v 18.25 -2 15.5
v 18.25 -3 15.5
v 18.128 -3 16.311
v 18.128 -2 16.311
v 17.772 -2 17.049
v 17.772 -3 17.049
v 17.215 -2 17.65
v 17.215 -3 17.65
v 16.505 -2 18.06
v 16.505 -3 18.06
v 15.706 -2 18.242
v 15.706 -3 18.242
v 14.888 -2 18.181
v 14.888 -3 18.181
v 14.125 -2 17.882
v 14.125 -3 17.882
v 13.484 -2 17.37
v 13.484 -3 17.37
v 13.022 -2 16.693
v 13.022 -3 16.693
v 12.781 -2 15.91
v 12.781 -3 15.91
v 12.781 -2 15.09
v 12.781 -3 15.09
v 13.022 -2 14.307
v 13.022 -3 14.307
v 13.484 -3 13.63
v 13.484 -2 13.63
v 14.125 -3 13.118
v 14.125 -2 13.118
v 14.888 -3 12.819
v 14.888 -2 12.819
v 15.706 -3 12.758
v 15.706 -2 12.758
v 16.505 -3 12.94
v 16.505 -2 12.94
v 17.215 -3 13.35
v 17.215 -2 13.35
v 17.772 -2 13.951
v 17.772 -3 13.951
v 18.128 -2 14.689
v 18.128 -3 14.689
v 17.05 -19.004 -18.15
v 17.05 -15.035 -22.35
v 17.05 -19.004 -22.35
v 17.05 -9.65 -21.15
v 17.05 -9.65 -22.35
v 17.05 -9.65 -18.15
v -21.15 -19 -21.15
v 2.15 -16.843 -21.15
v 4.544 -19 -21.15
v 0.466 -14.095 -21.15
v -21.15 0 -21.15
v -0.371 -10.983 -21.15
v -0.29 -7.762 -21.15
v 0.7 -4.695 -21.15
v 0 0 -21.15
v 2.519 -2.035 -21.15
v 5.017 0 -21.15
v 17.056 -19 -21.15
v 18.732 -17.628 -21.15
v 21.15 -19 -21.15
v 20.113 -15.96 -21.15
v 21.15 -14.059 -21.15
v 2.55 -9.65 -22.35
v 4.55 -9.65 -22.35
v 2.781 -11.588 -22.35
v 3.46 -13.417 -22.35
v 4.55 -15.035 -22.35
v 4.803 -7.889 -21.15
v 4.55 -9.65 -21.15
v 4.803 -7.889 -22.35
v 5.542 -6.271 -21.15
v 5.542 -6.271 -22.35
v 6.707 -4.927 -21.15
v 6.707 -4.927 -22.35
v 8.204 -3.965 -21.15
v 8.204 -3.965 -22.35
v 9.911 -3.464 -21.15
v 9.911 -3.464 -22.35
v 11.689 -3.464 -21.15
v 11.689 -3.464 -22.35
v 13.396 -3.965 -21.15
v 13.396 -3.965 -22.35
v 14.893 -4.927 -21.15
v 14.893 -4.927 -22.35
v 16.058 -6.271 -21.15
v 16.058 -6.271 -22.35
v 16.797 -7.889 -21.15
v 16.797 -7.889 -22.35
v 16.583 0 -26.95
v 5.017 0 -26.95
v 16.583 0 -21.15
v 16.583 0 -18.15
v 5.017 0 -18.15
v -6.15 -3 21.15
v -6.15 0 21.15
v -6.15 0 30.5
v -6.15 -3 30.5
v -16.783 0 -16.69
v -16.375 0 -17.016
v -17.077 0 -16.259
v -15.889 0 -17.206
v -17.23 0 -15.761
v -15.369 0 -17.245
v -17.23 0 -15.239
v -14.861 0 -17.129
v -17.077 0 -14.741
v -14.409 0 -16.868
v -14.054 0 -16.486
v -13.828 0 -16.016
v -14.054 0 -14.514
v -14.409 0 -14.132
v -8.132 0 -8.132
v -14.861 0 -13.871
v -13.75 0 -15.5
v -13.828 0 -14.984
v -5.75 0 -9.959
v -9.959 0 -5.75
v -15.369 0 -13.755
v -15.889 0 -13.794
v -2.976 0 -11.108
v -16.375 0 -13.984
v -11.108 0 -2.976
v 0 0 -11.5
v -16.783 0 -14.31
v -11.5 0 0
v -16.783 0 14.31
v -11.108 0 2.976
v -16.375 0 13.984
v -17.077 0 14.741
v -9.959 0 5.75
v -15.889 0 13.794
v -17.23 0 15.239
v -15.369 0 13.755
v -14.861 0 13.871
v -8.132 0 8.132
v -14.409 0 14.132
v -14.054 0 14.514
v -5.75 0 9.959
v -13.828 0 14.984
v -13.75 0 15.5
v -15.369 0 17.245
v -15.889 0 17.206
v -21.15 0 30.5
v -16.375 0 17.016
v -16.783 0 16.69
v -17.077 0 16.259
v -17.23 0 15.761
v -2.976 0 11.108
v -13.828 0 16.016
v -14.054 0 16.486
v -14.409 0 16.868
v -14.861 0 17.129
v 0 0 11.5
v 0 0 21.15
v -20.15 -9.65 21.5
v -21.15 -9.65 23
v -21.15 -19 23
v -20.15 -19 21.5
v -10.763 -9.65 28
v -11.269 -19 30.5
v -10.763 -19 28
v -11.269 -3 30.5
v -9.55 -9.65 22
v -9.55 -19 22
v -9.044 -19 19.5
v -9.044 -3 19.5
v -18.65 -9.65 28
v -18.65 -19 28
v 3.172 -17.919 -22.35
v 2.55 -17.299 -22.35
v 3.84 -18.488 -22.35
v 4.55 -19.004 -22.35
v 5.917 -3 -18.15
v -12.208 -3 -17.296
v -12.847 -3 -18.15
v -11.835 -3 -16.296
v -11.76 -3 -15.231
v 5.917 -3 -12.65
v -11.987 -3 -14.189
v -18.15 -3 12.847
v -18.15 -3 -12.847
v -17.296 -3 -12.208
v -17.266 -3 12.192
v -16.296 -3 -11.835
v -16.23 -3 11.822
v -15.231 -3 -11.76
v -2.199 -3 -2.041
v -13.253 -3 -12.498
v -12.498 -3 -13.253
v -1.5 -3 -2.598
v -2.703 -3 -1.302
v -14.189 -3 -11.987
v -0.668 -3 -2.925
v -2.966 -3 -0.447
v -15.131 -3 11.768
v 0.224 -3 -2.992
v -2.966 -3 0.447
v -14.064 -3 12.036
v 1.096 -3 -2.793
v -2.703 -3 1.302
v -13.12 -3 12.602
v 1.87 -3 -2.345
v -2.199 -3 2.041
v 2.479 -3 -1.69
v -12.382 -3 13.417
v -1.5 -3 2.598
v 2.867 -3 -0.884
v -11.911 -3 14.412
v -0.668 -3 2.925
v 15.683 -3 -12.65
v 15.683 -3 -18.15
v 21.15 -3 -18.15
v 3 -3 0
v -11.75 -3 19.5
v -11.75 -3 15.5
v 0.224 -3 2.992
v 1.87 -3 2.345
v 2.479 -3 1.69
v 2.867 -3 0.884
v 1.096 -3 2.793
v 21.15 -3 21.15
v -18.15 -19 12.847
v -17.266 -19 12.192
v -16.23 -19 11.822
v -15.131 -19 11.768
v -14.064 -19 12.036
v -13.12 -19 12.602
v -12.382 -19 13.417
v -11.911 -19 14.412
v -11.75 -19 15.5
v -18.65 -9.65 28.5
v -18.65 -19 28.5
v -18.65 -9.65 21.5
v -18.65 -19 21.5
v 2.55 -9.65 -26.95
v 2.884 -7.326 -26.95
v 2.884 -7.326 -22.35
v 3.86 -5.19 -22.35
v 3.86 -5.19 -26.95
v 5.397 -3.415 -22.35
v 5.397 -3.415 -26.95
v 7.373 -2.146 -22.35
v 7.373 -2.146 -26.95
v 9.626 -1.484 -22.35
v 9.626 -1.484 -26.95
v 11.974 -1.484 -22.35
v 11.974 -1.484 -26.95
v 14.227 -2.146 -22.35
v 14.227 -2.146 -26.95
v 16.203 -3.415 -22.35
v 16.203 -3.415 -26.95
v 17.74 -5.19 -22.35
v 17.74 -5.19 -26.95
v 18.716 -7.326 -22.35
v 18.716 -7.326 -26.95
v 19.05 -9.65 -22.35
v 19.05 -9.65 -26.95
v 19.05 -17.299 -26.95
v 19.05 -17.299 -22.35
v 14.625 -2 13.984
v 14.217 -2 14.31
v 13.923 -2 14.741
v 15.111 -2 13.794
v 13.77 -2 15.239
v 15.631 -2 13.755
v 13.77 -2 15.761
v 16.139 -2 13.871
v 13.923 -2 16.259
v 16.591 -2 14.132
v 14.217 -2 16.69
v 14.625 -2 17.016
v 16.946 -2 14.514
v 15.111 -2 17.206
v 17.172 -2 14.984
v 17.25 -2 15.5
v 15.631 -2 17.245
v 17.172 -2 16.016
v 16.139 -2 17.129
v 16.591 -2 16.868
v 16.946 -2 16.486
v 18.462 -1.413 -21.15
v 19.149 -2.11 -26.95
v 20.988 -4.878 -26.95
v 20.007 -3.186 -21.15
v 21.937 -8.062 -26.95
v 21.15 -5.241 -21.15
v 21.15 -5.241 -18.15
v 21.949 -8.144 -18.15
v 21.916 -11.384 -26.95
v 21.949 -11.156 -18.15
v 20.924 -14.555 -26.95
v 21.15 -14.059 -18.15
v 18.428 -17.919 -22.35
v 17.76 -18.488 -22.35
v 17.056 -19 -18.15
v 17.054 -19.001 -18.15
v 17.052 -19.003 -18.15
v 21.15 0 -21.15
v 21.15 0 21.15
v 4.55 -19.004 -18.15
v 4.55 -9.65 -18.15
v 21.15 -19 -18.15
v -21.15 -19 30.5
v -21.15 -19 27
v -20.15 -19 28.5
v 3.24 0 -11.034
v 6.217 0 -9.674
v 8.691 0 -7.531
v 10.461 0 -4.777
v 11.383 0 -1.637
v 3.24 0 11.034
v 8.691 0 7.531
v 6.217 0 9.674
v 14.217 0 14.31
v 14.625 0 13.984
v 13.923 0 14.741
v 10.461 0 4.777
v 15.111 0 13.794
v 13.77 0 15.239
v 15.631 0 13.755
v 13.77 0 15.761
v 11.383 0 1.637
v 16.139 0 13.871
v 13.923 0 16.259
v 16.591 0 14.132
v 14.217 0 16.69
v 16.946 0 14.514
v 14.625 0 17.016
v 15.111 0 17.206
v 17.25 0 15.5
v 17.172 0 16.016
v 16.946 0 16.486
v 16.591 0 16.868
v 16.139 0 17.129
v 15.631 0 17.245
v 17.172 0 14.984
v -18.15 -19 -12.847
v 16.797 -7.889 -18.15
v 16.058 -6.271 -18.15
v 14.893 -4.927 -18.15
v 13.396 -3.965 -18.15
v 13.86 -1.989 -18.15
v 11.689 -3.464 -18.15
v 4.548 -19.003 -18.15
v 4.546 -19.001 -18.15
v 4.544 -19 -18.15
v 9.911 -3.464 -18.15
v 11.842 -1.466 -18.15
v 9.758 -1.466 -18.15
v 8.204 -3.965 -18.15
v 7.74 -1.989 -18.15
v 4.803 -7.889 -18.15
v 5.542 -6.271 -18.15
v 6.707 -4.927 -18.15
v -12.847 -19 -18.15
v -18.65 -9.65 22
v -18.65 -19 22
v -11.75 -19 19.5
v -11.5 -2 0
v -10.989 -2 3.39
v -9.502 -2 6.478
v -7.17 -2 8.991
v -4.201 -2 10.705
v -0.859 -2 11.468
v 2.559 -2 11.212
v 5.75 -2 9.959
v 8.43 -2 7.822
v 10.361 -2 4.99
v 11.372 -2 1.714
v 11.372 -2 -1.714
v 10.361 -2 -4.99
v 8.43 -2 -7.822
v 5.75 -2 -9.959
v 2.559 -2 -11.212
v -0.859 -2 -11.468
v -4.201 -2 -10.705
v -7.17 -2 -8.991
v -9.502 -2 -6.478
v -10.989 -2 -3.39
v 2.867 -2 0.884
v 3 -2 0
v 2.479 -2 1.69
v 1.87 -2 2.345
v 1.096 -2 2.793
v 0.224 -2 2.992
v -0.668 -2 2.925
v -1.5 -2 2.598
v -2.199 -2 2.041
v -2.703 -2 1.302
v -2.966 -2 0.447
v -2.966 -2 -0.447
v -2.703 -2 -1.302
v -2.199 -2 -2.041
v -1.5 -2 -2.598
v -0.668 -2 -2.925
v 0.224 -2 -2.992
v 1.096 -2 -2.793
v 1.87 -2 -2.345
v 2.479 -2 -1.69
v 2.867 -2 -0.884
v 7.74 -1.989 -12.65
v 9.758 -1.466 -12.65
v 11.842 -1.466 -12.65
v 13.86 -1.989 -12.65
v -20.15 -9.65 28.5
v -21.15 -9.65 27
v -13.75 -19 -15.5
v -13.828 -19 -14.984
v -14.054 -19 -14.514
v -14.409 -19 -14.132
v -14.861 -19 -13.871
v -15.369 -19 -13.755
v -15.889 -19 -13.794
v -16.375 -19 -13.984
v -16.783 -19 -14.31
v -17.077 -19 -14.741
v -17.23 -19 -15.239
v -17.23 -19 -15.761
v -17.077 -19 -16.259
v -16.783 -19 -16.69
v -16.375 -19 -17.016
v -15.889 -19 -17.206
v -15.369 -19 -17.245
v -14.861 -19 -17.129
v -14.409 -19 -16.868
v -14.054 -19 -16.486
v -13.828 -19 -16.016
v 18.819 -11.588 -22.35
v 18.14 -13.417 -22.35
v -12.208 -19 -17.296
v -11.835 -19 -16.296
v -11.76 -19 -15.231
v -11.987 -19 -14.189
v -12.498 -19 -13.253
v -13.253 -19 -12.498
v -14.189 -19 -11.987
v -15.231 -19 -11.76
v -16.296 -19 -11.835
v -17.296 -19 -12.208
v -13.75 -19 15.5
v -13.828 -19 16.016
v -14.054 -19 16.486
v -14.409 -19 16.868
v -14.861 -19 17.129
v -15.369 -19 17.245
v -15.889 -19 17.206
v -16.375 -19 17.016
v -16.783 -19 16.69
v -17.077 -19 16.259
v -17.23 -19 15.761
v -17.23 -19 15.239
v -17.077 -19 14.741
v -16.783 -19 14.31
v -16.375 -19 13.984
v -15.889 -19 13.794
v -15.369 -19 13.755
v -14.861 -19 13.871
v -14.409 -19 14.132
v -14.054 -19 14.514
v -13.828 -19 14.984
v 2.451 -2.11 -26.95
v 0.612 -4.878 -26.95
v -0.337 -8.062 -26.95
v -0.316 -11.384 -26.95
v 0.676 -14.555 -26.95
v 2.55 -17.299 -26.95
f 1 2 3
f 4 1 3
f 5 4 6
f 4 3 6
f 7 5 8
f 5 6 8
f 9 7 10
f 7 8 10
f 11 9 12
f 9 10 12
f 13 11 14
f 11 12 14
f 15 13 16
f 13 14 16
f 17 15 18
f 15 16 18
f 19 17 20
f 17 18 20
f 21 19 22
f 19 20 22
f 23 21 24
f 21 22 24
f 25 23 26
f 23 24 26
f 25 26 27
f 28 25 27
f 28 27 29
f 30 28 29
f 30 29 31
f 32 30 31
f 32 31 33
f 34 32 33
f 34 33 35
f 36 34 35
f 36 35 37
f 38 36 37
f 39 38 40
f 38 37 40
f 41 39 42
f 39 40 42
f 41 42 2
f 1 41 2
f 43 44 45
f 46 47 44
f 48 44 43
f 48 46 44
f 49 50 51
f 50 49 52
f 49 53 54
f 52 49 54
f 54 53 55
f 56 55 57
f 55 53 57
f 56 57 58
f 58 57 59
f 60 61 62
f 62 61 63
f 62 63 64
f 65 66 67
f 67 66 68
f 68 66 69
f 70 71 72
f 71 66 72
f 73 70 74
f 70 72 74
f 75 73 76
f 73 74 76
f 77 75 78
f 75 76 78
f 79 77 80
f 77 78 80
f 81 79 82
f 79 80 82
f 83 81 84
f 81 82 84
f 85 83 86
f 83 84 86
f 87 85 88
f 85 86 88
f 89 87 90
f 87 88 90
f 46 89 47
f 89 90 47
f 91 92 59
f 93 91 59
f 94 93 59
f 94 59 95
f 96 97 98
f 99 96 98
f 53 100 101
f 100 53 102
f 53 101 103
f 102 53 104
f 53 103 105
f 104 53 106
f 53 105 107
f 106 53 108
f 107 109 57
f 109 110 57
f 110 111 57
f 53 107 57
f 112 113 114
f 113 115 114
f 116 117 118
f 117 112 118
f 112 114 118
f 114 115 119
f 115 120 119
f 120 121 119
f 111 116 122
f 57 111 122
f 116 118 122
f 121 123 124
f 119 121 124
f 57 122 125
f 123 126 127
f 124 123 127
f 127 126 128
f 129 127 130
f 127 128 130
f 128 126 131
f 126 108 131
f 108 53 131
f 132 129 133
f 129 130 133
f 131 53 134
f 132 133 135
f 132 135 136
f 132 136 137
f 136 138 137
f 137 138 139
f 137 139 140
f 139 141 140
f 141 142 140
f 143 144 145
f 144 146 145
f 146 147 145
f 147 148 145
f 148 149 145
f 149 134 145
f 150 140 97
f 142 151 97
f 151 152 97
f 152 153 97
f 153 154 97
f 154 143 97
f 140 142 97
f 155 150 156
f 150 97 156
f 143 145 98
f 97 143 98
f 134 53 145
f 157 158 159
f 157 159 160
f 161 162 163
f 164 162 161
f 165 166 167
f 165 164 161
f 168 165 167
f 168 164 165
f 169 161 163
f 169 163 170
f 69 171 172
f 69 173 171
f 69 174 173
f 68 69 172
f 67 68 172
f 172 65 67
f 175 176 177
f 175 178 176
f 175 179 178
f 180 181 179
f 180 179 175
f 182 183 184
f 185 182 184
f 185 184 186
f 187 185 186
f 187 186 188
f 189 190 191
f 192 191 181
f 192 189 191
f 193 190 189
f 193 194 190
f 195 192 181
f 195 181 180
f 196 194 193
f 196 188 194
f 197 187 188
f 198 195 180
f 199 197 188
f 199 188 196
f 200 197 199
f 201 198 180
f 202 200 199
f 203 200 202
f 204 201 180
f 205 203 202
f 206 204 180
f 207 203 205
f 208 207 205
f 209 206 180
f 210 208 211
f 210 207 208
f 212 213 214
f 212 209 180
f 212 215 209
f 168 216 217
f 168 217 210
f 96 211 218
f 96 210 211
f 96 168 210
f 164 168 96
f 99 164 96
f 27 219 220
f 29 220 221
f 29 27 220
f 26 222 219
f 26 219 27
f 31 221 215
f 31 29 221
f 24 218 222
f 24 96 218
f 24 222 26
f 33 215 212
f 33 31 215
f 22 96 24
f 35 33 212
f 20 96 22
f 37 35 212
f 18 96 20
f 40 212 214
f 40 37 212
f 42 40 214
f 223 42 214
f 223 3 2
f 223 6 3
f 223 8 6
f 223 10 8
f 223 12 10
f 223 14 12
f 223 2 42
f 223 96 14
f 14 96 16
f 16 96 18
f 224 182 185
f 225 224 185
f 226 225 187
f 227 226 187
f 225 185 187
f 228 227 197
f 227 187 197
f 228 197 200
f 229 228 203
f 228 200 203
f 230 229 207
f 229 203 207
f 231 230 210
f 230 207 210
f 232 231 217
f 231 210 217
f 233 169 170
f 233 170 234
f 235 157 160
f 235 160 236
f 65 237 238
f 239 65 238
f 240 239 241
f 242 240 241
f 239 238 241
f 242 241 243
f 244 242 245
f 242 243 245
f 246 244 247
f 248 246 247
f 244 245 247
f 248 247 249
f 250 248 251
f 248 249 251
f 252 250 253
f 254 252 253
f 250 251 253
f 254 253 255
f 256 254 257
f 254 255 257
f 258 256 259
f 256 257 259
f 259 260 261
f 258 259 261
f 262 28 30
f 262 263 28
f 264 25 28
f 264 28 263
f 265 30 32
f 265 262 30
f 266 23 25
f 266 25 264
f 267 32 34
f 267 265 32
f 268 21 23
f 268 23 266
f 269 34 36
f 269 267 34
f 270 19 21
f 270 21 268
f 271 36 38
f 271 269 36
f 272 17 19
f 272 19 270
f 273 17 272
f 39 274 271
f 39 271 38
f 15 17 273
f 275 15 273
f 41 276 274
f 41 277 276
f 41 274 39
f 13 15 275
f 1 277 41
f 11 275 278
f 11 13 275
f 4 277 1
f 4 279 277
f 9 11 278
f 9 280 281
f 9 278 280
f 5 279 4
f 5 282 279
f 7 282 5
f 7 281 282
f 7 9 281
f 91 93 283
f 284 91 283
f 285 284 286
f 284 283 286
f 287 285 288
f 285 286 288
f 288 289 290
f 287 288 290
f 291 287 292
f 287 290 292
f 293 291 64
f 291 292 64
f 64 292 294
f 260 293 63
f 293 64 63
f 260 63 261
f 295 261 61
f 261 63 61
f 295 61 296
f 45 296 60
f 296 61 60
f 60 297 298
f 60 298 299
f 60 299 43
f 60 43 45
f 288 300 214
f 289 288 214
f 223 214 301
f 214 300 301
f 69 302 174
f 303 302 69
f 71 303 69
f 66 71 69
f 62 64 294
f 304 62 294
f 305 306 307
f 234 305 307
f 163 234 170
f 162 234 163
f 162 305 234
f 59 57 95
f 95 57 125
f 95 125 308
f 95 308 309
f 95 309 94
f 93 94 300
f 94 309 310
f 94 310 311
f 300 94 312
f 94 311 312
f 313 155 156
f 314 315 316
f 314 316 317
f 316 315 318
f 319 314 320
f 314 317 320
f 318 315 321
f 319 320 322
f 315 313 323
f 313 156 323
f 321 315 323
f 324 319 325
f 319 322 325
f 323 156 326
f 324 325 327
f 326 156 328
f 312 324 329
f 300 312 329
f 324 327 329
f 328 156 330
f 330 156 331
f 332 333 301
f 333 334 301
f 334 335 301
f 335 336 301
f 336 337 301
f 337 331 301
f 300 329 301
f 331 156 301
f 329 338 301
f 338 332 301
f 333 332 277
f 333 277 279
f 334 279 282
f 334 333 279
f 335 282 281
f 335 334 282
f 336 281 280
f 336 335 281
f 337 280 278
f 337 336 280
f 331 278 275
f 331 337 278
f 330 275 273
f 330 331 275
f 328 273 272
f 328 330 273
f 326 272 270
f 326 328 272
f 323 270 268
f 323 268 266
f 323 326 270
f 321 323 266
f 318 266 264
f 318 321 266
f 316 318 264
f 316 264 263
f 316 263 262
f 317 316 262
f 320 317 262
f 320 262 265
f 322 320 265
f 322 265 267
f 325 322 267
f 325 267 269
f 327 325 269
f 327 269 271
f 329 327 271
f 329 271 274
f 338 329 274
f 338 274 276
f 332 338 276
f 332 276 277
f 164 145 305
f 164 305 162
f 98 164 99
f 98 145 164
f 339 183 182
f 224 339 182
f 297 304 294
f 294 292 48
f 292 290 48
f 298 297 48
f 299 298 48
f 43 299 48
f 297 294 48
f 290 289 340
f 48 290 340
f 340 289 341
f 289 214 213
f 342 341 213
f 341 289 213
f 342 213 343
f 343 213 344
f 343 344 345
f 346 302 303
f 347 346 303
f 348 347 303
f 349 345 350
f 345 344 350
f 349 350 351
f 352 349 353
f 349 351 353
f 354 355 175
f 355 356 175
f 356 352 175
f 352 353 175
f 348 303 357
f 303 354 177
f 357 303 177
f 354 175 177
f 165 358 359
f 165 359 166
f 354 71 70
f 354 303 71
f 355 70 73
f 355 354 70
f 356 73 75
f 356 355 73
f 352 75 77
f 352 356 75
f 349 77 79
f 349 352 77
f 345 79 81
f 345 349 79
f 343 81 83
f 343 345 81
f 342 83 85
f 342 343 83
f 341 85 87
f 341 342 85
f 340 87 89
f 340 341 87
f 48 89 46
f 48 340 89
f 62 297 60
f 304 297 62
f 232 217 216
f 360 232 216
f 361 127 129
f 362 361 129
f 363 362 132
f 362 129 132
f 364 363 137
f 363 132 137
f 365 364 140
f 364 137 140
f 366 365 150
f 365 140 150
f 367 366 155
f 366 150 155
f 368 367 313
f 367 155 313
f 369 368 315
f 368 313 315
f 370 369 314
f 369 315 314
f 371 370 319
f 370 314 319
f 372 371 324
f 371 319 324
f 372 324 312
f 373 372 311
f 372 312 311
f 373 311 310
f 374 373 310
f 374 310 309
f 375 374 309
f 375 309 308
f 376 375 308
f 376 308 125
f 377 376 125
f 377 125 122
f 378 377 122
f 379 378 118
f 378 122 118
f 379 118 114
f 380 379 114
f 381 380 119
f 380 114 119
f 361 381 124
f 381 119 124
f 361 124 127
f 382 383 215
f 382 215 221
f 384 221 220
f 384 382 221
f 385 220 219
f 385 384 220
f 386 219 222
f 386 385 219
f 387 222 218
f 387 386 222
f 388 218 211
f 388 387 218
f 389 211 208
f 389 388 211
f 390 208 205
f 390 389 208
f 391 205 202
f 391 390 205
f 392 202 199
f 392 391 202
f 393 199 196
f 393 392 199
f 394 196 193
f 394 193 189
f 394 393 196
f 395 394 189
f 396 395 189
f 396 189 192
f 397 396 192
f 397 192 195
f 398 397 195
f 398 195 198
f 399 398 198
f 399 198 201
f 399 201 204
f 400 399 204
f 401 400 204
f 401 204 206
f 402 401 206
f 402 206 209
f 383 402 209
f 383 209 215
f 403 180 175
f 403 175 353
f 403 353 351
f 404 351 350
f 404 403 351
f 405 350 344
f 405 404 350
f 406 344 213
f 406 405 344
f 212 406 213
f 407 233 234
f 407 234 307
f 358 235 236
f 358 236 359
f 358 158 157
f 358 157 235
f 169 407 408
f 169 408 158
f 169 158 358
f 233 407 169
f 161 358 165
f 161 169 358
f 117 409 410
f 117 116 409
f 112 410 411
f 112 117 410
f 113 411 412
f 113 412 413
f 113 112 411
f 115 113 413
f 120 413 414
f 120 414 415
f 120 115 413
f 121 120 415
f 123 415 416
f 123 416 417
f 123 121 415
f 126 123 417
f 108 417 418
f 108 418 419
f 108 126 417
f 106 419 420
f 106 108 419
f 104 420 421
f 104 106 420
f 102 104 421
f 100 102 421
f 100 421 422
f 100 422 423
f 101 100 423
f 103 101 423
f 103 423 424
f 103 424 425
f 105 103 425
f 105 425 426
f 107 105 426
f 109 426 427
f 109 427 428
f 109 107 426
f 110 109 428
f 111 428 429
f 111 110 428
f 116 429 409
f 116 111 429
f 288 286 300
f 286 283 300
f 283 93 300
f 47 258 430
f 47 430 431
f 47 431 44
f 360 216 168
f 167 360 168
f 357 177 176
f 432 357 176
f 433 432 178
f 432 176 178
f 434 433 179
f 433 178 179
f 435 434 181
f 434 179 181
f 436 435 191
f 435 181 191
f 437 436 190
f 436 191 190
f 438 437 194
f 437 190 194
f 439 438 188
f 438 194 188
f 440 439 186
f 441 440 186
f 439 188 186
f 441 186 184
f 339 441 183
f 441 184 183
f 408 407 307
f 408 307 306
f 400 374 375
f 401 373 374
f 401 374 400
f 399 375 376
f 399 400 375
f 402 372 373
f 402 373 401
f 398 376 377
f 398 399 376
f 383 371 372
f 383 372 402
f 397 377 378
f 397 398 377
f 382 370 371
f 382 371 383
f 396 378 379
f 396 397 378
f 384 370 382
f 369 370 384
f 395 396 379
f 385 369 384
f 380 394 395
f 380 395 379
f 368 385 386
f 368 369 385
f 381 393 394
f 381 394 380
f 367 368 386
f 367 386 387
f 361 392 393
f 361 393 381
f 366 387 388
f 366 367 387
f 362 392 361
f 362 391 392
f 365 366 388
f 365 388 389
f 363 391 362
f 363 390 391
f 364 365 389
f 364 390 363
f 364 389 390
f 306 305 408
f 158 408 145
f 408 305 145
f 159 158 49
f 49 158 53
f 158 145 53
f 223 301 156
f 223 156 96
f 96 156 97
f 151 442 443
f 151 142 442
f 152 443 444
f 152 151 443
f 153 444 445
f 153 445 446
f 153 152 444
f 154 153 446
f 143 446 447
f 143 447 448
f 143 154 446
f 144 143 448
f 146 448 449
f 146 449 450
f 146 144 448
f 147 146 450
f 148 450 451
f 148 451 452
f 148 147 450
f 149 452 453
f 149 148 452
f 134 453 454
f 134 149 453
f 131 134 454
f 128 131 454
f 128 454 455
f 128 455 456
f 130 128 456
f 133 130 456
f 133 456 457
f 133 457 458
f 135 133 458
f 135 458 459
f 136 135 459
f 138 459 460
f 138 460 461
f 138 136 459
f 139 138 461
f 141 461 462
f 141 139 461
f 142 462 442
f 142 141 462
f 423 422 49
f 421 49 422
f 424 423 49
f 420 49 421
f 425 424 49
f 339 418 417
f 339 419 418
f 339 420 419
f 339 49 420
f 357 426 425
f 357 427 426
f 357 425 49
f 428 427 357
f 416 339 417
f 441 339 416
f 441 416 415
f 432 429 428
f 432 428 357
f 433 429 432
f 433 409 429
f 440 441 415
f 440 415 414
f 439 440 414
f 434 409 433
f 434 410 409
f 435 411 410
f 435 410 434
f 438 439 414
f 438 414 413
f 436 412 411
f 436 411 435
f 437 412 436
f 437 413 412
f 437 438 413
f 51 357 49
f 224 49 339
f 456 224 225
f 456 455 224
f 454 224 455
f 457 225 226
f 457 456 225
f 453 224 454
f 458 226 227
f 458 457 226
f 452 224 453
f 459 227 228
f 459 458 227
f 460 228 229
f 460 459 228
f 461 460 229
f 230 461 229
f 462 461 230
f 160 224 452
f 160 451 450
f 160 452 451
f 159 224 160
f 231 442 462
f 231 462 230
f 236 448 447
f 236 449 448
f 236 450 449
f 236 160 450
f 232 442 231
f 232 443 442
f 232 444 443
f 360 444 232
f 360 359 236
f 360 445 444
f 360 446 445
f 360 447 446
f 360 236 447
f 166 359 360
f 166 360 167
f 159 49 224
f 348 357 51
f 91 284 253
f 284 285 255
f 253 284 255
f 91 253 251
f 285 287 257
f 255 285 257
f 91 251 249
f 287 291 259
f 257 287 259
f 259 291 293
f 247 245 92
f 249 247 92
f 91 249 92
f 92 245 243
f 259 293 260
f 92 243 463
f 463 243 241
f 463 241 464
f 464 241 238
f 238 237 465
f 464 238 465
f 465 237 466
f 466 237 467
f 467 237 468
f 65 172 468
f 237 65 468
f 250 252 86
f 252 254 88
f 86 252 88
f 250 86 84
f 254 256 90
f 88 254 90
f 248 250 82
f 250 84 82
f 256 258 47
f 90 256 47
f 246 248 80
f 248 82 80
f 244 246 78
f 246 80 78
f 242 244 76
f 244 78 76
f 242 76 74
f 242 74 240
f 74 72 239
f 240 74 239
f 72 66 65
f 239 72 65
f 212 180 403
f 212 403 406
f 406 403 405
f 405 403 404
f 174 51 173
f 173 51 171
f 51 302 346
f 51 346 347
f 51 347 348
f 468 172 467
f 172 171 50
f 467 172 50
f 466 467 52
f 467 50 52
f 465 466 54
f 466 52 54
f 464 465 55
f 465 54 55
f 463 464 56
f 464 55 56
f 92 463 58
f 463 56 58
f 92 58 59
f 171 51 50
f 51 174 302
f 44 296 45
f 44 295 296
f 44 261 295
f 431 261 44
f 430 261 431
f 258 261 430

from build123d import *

# Parameters (mm, degrees)
F0_W      = 42.3
F0_H      = 42.3
F0_R      = 1.75
F0_R_2    = 3
F1_DEPTH  = 3
F2_R      = 11.5
F3_DEPTH  = 2
F4_R      = 1.75
F5_DEPTH  = 16
F9_W      = 15
F9_H      = 11
F10_DEPTH = 19
F11_DEPTH = 10
F18_DEPTH = 11.251
F19_W     = 28.3221583813
F19_H     = 99.7033566236
F20_DEPTH = 22.051
F22_DEPTH = 16.0051434669
F23_R     = 2.75
F23_R_2   = 1.75
F24_DEPTH = 1


# Not quite as in the source:
# - a feature names something its author has since deleted; it is built from what else it names


with BuildPart() as f1:
    # F0 (on Front) → F1 (new body)
    with BuildSketch(Plane.XZ):
        Rectangle(F0_W, F0_H)
        with Locations((-15.5, -15.5)):
            Circle(F0_R, mode=Mode.SUBTRACT)
        with Locations((-15.5, 15.5)):
            Circle(F0_R, mode=Mode.SUBTRACT)
        Circle(F0_R_2, mode=Mode.SUBTRACT)
        with Locations((15.5, 15.5)):
            Circle(F0_R, mode=Mode.SUBTRACT)
    extrude(amount=F1_DEPTH)

    # F2 (on face) → F3 (cut)
    with BuildSketch(Plane(origin=(0, 0, 0), x_dir=(-1, 0, 0), z_dir=(0, 1, 0))):
        Circle(F2_R)
    extrude(amount=-F3_DEPTH, mode=Mode.SUBTRACT)

    # F4 (on face) → F5 (join)
    with BuildSketch(Plane.XZ.offset(3)):
        with BuildLine():
            Line((-11.75, 21.15), (-21.15, 21.15))
            Line((-21.15, 21.15), (-21.15, -21.15))
            Line((-21.15, -21.15), (21.15, -21.15))
            Line((21.15, -21.15), (21.15, -18.15))
            Line((21.15, -18.15), (-12.8467001677, -18.15))
            ThreePointArc((-12.8467001677, -18.15), (-12.8483495706, -12.8483495706), (-18.15, -12.8467001677))
            Line((-18.15, -12.8467001677), (-18.15, 12.8467001677))
            ThreePointArc((-18.15, 12.8467001677), (-14.0638593384, 12.0358983849), (-11.75, 15.5))
            Line((-11.75, 15.5), (-11.75, 21.15))
        make_face()
        with Locations((-15.5, -15.5)):
            Circle(F4_R, mode=Mode.SUBTRACT)
        with Locations((-15.5, 15.5)):
            Circle(F4_R, mode=Mode.SUBTRACT)
    extrude(amount=F5_DEPTH)

    # F9 (on Front) → F10 (join, through all)
    with BuildSketch(Plane.XZ):
        with Locations((-13.65, 25)):
            Rectangle(F9_W, F9_H)
    extrude(amount=F10_DEPTH)

    # F8 (on offset) → F11 (cut)
    with BuildSketch(Plane.XZ.offset(9.65)):
        Polygon((0, 22), (0, 28), (-18.65, 28), (-18.65, 28.5), (-20.15, 28.5), (-21.15, 27), (-21.15, 23), (-20.15, 21.5), (-18.65, 21.5), (-18.65, 22), align=None)
    extrude(amount=F11_DEPTH, mode=Mode.SUBTRACT)

    # F13 (on offset) → F14 (revolve, cut)
    with BuildSketch(Plane.XZ.offset(9.65)):
        Polygon((17.05, -18.15), (19.05, -18.15), (19.05, -12.65), (10.8, -12.65), (10.8, -26.95), (19.05, -26.95), (19.05, -22.35), (17.05, -22.35), align=None)
    revolve(axis=Axis((10.8, -9.65, -5.160998553), (0, 0, -1)), mode=Mode.SUBTRACT)

    # F15 (on offset) → F16 (revolve)
    with BuildSketch(Plane.XZ.offset(9.65)):
        Polygon((19.05, -18.15), (17.05, -18.15), (17.05, -22.35), (19.05, -22.35), (19.05, -26.95), (22.05, -26.95), (22.05, -18.15), align=None)
    revolve(axis=Axis((10.8, -9.65, -5.160998553), (0, 0, -1)))

    # F17 (on offset) → F18 (cut, through all)
    with BuildSketch(Plane.XZ.offset(9.65)):
        Polygon((2.55, -12.65), (2.55, -18.15), (4.55, -18.15), (4.55, -22.35), (2.55, -22.35), (2.55, -26.95), (19.05, -26.95), (19.05, -22.35), (17.05, -22.35), (17.05, -18.15), (19.05, -18.15), (19.05, -12.65), align=None)
    extrude(amount=F18_DEPTH, mode=Mode.SUBTRACT)

    # F19 (on Right) → F20 (cut, through all)
    with BuildSketch(Plane.YZ):
        with Locations((14.1610791907, -2.7998201549)):
            Rectangle(F19_W, F19_H)
    extrude(amount=F20_DEPTH, mode=Mode.SUBTRACT)

    # F21 (on face) → F22 (cut, through all)
    with BuildSketch(Plane.XZ.offset(3)):
        with BuildLine():
            ThreePointArc((-4.9008020267, -0.9910295129), (0.9910295129, -4.9008020267), (4.9008020267, 0.9910295129))
            Line((4.9008020267, 0.9910295129), (-4.0184635896, 45.0982477529))
            ThreePointArc((-4.0184635896, 45.0982477529), (-9.9102951291, 49.0080202666), (-13.8200676429, 43.116188727))
            Line((-13.8200676429, 43.116188727), (-4.9008020267, -0.9910295129))
        make_face()
    extrude(amount=F22_DEPTH, mode=Mode.SUBTRACT)

    # F23 (on face) → F24 (cut)
    with BuildSketch(Plane.XZ.offset(3)):
        with Locations((15.5, 15.5)):
            Circle(F23_R)
        with Locations((15.5, 15.5)):
            Circle(F23_R_2, mode=Mode.SUBTRACT)
    extrude(amount=-F24_DEPTH, mode=Mode.SUBTRACT)


solid = f1.part
